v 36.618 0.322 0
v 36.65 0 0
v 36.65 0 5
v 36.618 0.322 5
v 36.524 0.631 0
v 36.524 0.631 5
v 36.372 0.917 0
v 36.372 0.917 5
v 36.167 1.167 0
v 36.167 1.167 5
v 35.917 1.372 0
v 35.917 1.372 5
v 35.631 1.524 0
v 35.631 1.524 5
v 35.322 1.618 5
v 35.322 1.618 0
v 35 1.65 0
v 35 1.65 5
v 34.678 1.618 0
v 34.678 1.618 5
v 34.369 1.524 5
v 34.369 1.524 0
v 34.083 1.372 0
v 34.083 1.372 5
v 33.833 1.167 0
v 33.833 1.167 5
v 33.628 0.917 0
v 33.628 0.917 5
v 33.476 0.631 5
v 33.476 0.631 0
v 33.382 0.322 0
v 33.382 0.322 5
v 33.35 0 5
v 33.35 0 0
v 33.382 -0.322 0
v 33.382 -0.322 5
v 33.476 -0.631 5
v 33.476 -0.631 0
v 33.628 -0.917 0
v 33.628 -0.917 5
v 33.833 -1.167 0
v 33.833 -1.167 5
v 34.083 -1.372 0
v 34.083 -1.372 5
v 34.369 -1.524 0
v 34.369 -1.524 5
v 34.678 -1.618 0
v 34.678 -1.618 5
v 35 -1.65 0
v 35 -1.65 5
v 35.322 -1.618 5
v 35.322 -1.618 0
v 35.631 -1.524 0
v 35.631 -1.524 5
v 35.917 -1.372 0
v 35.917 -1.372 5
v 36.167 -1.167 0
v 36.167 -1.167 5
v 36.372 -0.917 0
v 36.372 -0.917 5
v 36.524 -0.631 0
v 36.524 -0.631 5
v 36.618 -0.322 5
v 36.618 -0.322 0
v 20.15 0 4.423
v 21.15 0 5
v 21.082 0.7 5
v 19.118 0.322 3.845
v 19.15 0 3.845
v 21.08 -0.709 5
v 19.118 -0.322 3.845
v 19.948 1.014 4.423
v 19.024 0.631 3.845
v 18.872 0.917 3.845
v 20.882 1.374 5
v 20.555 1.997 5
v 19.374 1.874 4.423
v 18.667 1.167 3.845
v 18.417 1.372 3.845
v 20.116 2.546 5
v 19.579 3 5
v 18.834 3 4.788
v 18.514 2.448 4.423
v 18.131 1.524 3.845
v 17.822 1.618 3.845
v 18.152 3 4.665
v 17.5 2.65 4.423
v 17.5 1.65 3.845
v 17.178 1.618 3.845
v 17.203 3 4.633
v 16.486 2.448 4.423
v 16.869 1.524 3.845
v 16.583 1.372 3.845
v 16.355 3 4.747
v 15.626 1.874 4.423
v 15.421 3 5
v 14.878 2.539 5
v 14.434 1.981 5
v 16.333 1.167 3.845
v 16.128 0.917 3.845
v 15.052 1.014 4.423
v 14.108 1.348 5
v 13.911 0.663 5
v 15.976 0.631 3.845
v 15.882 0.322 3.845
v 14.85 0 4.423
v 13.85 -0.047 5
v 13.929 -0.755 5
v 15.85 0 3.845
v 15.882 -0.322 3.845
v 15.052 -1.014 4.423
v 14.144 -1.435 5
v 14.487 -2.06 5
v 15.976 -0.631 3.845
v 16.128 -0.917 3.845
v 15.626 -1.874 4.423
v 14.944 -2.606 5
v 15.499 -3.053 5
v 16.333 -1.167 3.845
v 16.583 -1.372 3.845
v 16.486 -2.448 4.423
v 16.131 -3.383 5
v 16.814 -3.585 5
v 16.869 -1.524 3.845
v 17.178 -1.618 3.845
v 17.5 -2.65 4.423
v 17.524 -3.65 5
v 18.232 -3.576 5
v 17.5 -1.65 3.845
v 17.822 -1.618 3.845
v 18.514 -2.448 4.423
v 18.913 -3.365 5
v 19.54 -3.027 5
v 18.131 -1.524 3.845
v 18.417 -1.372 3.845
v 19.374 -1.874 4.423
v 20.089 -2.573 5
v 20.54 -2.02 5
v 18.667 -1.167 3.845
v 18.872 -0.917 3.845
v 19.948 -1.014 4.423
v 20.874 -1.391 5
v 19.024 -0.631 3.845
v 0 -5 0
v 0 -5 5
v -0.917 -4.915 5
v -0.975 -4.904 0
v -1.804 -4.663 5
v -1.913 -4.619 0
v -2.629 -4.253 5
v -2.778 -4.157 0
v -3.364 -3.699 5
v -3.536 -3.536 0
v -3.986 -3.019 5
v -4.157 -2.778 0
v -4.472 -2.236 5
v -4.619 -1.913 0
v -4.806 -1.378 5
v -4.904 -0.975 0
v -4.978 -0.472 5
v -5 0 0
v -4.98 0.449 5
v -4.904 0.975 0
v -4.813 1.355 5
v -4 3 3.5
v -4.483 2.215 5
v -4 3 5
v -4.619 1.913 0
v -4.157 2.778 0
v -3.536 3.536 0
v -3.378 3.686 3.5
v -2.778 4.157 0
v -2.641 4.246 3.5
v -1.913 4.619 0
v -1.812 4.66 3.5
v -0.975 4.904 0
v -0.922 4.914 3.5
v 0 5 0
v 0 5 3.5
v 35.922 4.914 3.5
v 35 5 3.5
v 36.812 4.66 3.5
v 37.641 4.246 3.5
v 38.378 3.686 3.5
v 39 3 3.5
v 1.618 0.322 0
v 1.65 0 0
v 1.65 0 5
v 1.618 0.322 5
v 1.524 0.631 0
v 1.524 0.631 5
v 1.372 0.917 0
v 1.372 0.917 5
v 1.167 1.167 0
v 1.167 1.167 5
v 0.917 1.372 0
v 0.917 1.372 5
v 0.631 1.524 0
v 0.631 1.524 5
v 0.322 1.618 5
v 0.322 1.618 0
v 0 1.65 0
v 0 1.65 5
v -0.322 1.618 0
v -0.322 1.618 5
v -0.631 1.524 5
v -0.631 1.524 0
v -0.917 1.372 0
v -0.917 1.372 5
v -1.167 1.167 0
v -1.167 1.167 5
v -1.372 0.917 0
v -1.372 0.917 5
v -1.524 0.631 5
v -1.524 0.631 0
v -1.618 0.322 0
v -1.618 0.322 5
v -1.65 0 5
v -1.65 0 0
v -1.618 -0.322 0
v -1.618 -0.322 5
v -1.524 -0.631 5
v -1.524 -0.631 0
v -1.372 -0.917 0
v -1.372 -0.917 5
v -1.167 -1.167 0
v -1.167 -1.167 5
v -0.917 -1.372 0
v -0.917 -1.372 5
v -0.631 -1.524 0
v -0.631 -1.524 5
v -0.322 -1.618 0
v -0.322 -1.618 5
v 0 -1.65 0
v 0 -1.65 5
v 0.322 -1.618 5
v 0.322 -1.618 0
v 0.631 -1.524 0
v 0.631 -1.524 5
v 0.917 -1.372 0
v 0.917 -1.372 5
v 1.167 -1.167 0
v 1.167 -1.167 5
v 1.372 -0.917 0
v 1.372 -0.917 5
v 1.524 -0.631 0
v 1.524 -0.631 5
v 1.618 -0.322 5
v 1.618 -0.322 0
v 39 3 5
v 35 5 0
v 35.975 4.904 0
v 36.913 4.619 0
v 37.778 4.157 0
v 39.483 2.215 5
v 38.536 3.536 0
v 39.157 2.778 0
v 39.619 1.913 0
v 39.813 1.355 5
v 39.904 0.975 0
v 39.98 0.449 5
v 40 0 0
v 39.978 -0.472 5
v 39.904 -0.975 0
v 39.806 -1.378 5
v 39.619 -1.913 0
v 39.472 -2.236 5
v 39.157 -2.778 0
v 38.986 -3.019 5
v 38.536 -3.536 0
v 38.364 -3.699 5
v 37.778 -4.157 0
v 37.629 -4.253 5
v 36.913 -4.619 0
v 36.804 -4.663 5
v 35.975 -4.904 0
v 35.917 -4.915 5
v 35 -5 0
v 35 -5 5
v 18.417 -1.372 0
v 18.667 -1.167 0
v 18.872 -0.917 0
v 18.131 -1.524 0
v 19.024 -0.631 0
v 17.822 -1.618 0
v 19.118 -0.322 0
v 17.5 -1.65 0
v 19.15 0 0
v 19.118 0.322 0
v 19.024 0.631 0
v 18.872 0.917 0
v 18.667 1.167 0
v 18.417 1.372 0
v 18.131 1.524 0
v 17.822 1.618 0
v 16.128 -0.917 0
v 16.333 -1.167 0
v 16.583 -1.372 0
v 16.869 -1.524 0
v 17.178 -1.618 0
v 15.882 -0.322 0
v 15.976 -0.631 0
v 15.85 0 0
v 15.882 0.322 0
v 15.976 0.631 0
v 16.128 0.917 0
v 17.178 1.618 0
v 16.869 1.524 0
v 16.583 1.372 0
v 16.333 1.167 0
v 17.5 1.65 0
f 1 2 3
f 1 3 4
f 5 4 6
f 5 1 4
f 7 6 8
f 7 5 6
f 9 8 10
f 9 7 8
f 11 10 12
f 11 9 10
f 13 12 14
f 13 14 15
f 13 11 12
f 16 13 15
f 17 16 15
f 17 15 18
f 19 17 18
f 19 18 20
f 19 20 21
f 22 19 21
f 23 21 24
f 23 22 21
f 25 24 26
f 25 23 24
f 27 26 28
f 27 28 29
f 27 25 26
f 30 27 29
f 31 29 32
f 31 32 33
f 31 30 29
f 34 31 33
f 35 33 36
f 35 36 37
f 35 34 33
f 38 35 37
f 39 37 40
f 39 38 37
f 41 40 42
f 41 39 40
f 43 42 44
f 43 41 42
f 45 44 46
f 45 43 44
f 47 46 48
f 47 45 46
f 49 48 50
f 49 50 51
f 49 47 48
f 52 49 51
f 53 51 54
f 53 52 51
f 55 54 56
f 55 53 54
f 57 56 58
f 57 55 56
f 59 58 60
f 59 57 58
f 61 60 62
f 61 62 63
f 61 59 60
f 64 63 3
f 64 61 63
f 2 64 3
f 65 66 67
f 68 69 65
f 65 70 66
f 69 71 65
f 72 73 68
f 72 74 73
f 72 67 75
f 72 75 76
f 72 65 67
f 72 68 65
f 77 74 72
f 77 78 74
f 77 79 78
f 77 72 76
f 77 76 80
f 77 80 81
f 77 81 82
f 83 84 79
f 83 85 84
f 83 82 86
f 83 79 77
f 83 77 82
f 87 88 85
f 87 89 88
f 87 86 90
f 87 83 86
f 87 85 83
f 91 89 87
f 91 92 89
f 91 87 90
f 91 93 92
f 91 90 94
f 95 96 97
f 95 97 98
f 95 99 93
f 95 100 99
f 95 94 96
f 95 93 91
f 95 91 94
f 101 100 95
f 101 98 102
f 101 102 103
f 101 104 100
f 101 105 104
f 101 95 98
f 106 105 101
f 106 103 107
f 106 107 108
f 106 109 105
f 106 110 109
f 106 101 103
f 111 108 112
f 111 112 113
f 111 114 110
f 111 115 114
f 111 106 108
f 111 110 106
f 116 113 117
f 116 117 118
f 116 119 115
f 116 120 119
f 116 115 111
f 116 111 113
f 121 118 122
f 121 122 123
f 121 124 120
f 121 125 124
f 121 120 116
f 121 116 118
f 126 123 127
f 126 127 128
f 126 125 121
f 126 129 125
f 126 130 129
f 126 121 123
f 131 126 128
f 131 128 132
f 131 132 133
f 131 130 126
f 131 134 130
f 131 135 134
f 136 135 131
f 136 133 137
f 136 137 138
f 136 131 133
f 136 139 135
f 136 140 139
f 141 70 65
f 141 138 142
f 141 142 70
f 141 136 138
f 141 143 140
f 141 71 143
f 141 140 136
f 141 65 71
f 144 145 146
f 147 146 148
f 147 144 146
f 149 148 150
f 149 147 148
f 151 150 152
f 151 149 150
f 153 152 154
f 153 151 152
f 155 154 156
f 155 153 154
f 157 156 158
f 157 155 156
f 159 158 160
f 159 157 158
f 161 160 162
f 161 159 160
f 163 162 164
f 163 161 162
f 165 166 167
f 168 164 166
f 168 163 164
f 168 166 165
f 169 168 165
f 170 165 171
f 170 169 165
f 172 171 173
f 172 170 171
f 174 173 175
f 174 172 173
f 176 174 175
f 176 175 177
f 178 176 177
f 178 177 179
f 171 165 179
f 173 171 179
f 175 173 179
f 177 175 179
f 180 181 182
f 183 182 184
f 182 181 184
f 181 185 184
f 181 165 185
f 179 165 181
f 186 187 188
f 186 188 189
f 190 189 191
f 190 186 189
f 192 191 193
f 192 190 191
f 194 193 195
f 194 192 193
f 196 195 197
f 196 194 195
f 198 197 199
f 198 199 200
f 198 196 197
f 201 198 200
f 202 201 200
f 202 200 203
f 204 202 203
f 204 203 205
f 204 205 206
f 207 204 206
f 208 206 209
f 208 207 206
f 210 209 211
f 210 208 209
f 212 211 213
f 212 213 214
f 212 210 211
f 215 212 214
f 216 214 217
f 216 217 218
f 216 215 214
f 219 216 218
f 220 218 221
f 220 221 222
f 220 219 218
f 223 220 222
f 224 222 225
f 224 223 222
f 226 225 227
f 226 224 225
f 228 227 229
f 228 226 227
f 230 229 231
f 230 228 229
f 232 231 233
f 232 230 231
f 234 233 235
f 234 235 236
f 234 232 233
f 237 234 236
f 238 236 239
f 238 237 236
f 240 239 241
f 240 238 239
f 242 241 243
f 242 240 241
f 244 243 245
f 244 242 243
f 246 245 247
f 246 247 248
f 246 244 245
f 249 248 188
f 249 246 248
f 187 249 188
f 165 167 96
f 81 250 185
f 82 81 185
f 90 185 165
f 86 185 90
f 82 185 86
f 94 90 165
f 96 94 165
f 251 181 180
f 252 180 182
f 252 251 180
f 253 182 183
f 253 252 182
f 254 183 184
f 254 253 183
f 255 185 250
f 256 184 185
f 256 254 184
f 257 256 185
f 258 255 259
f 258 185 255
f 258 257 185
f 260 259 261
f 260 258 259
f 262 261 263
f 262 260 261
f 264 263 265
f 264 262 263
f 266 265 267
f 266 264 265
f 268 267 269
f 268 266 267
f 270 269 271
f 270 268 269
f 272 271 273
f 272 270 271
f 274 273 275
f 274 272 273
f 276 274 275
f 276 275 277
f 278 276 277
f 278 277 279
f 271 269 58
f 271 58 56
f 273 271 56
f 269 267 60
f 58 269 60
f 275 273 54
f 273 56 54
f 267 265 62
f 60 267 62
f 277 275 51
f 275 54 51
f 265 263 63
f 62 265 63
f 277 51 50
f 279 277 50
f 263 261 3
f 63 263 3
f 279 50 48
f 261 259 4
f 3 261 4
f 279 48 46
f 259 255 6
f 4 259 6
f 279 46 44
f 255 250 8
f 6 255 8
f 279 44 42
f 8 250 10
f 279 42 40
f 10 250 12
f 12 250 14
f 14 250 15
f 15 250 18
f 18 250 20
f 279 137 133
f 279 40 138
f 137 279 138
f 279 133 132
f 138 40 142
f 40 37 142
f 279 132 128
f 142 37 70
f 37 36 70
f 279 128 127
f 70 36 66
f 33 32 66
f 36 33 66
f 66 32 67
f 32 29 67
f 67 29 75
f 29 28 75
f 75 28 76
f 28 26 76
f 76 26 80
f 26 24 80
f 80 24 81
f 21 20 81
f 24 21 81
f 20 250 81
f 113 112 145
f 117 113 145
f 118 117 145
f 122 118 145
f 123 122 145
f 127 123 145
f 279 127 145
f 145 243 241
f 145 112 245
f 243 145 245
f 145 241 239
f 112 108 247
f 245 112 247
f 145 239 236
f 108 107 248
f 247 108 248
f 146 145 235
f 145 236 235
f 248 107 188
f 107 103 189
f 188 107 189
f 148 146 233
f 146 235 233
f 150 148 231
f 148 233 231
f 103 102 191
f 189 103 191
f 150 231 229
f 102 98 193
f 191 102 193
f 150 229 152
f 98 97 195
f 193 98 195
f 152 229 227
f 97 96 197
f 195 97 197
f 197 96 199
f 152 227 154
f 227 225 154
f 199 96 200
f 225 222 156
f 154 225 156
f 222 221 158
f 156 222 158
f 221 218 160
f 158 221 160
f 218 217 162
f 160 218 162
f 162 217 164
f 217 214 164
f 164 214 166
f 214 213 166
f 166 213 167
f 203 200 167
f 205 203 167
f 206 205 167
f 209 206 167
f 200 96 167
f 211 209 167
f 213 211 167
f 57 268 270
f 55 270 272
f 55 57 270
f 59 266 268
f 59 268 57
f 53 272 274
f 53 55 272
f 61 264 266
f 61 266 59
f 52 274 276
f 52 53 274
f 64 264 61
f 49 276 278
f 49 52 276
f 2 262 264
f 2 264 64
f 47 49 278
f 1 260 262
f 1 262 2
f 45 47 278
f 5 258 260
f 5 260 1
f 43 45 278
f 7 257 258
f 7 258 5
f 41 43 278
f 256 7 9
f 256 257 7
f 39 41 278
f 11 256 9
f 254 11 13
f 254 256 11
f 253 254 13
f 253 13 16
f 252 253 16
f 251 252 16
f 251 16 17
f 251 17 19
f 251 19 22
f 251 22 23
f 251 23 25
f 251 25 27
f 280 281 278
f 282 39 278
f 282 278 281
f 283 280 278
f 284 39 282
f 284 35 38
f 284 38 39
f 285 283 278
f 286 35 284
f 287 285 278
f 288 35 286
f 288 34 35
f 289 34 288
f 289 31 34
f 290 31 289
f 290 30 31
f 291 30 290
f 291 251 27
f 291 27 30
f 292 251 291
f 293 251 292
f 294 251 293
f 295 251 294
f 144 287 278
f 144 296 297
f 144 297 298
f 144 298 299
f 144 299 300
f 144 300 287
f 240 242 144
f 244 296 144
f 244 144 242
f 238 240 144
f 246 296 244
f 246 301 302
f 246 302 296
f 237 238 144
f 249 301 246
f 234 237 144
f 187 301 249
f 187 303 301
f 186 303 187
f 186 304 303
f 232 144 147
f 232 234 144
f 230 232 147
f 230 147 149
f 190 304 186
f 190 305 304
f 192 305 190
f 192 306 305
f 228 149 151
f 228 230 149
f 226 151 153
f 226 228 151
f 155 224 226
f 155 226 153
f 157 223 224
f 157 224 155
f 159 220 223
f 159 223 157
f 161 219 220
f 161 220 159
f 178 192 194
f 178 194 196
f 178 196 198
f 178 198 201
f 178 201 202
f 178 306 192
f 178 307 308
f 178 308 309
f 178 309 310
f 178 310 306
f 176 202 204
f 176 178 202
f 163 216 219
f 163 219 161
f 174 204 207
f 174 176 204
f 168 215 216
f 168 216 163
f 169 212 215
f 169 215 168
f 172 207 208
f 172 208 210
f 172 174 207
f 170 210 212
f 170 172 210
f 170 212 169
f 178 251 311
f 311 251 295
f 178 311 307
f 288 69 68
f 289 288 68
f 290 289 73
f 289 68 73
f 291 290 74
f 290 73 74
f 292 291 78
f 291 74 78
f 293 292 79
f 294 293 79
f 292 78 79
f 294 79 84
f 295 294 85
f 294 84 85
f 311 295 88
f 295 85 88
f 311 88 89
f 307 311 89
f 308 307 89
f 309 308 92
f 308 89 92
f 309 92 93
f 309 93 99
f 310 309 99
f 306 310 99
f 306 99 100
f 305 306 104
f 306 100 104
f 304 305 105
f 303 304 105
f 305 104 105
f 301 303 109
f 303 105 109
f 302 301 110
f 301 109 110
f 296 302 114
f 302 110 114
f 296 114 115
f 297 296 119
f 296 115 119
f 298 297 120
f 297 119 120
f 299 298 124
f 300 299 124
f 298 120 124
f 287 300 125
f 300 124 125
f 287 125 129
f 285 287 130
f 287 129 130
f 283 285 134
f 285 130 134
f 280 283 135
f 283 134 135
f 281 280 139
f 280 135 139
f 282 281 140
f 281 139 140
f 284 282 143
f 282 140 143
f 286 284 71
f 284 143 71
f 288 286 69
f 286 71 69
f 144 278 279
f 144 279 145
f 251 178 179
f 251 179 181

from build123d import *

# Parameters (mm, degrees)
SKETCH1_R           = 1.65
BOSS_EXTRUDE1_DEPTH = 5
SKETCH2_R           = 1.65
CUT_EXTRUDE1_DEPTH  = 5
CHAMFER1_SIZE       = 2
CHAMFER1_SIZE2      = 1.154700538
SKETCH3_W           = 1.5
SKETCH3_H           = 2
CUT_EXTRUDE2_DEPTH  = 47.5


with BuildPart() as part:
    # Sketch1 → Boss-Extrude1 (new body)
    with BuildSketch(Plane.XY):
        with BuildLine():
            Line((0, 5), (35, 5))
            ThreePointArc((35, 5), (40, 0), (35, -5))
            Line((35, -5), (0, -5))
            ThreePointArc((0, -5), (-5, 0), (0, 5))
        make_face()
        with Locations((35, 0)):
            Circle(SKETCH1_R, mode=Mode.SUBTRACT)
        Circle(SKETCH1_R, mode=Mode.SUBTRACT)
    extrude(amount=BOSS_EXTRUDE1_DEPTH)

    # Sketch2 → Cut-Extrude1 (cut)
    with BuildSketch(Plane.XY.offset(5)):
        with Locations((17.5, 0)):
            Circle(SKETCH2_R)
    extrude(amount=-CUT_EXTRUDE1_DEPTH, mode=Mode.SUBTRACT)

    # Chamfer1
    chamfer1_edges = [part.edges().sort_by_distance(p)[0] for p in [
        (15.85, 0, 5),
    ]]
    chamfer1_side = [part.faces().sort_by_distance(p)[0] for p in [
        (17.5, 4.539022777, 5),
    ]]
    chamfer(chamfer1_edges, length=CHAMFER1_SIZE, length2=CHAMFER1_SIZE2, reference=chamfer1_side[0])

    # Sketch3 → Cut-Extrude2 (cut, symmetric)
    with BuildSketch(Plane(origin=(0, 0, 0), x_dir=(0, 0, -1), z_dir=(1, 0, 0))):
        with Locations((-4.25, 4)):
            Rectangle(SKETCH3_W, SKETCH3_H)
    extrude(amount=CUT_EXTRUDE2_DEPTH, both=True, mode=Mode.SUBTRACT)


solid = part.part
